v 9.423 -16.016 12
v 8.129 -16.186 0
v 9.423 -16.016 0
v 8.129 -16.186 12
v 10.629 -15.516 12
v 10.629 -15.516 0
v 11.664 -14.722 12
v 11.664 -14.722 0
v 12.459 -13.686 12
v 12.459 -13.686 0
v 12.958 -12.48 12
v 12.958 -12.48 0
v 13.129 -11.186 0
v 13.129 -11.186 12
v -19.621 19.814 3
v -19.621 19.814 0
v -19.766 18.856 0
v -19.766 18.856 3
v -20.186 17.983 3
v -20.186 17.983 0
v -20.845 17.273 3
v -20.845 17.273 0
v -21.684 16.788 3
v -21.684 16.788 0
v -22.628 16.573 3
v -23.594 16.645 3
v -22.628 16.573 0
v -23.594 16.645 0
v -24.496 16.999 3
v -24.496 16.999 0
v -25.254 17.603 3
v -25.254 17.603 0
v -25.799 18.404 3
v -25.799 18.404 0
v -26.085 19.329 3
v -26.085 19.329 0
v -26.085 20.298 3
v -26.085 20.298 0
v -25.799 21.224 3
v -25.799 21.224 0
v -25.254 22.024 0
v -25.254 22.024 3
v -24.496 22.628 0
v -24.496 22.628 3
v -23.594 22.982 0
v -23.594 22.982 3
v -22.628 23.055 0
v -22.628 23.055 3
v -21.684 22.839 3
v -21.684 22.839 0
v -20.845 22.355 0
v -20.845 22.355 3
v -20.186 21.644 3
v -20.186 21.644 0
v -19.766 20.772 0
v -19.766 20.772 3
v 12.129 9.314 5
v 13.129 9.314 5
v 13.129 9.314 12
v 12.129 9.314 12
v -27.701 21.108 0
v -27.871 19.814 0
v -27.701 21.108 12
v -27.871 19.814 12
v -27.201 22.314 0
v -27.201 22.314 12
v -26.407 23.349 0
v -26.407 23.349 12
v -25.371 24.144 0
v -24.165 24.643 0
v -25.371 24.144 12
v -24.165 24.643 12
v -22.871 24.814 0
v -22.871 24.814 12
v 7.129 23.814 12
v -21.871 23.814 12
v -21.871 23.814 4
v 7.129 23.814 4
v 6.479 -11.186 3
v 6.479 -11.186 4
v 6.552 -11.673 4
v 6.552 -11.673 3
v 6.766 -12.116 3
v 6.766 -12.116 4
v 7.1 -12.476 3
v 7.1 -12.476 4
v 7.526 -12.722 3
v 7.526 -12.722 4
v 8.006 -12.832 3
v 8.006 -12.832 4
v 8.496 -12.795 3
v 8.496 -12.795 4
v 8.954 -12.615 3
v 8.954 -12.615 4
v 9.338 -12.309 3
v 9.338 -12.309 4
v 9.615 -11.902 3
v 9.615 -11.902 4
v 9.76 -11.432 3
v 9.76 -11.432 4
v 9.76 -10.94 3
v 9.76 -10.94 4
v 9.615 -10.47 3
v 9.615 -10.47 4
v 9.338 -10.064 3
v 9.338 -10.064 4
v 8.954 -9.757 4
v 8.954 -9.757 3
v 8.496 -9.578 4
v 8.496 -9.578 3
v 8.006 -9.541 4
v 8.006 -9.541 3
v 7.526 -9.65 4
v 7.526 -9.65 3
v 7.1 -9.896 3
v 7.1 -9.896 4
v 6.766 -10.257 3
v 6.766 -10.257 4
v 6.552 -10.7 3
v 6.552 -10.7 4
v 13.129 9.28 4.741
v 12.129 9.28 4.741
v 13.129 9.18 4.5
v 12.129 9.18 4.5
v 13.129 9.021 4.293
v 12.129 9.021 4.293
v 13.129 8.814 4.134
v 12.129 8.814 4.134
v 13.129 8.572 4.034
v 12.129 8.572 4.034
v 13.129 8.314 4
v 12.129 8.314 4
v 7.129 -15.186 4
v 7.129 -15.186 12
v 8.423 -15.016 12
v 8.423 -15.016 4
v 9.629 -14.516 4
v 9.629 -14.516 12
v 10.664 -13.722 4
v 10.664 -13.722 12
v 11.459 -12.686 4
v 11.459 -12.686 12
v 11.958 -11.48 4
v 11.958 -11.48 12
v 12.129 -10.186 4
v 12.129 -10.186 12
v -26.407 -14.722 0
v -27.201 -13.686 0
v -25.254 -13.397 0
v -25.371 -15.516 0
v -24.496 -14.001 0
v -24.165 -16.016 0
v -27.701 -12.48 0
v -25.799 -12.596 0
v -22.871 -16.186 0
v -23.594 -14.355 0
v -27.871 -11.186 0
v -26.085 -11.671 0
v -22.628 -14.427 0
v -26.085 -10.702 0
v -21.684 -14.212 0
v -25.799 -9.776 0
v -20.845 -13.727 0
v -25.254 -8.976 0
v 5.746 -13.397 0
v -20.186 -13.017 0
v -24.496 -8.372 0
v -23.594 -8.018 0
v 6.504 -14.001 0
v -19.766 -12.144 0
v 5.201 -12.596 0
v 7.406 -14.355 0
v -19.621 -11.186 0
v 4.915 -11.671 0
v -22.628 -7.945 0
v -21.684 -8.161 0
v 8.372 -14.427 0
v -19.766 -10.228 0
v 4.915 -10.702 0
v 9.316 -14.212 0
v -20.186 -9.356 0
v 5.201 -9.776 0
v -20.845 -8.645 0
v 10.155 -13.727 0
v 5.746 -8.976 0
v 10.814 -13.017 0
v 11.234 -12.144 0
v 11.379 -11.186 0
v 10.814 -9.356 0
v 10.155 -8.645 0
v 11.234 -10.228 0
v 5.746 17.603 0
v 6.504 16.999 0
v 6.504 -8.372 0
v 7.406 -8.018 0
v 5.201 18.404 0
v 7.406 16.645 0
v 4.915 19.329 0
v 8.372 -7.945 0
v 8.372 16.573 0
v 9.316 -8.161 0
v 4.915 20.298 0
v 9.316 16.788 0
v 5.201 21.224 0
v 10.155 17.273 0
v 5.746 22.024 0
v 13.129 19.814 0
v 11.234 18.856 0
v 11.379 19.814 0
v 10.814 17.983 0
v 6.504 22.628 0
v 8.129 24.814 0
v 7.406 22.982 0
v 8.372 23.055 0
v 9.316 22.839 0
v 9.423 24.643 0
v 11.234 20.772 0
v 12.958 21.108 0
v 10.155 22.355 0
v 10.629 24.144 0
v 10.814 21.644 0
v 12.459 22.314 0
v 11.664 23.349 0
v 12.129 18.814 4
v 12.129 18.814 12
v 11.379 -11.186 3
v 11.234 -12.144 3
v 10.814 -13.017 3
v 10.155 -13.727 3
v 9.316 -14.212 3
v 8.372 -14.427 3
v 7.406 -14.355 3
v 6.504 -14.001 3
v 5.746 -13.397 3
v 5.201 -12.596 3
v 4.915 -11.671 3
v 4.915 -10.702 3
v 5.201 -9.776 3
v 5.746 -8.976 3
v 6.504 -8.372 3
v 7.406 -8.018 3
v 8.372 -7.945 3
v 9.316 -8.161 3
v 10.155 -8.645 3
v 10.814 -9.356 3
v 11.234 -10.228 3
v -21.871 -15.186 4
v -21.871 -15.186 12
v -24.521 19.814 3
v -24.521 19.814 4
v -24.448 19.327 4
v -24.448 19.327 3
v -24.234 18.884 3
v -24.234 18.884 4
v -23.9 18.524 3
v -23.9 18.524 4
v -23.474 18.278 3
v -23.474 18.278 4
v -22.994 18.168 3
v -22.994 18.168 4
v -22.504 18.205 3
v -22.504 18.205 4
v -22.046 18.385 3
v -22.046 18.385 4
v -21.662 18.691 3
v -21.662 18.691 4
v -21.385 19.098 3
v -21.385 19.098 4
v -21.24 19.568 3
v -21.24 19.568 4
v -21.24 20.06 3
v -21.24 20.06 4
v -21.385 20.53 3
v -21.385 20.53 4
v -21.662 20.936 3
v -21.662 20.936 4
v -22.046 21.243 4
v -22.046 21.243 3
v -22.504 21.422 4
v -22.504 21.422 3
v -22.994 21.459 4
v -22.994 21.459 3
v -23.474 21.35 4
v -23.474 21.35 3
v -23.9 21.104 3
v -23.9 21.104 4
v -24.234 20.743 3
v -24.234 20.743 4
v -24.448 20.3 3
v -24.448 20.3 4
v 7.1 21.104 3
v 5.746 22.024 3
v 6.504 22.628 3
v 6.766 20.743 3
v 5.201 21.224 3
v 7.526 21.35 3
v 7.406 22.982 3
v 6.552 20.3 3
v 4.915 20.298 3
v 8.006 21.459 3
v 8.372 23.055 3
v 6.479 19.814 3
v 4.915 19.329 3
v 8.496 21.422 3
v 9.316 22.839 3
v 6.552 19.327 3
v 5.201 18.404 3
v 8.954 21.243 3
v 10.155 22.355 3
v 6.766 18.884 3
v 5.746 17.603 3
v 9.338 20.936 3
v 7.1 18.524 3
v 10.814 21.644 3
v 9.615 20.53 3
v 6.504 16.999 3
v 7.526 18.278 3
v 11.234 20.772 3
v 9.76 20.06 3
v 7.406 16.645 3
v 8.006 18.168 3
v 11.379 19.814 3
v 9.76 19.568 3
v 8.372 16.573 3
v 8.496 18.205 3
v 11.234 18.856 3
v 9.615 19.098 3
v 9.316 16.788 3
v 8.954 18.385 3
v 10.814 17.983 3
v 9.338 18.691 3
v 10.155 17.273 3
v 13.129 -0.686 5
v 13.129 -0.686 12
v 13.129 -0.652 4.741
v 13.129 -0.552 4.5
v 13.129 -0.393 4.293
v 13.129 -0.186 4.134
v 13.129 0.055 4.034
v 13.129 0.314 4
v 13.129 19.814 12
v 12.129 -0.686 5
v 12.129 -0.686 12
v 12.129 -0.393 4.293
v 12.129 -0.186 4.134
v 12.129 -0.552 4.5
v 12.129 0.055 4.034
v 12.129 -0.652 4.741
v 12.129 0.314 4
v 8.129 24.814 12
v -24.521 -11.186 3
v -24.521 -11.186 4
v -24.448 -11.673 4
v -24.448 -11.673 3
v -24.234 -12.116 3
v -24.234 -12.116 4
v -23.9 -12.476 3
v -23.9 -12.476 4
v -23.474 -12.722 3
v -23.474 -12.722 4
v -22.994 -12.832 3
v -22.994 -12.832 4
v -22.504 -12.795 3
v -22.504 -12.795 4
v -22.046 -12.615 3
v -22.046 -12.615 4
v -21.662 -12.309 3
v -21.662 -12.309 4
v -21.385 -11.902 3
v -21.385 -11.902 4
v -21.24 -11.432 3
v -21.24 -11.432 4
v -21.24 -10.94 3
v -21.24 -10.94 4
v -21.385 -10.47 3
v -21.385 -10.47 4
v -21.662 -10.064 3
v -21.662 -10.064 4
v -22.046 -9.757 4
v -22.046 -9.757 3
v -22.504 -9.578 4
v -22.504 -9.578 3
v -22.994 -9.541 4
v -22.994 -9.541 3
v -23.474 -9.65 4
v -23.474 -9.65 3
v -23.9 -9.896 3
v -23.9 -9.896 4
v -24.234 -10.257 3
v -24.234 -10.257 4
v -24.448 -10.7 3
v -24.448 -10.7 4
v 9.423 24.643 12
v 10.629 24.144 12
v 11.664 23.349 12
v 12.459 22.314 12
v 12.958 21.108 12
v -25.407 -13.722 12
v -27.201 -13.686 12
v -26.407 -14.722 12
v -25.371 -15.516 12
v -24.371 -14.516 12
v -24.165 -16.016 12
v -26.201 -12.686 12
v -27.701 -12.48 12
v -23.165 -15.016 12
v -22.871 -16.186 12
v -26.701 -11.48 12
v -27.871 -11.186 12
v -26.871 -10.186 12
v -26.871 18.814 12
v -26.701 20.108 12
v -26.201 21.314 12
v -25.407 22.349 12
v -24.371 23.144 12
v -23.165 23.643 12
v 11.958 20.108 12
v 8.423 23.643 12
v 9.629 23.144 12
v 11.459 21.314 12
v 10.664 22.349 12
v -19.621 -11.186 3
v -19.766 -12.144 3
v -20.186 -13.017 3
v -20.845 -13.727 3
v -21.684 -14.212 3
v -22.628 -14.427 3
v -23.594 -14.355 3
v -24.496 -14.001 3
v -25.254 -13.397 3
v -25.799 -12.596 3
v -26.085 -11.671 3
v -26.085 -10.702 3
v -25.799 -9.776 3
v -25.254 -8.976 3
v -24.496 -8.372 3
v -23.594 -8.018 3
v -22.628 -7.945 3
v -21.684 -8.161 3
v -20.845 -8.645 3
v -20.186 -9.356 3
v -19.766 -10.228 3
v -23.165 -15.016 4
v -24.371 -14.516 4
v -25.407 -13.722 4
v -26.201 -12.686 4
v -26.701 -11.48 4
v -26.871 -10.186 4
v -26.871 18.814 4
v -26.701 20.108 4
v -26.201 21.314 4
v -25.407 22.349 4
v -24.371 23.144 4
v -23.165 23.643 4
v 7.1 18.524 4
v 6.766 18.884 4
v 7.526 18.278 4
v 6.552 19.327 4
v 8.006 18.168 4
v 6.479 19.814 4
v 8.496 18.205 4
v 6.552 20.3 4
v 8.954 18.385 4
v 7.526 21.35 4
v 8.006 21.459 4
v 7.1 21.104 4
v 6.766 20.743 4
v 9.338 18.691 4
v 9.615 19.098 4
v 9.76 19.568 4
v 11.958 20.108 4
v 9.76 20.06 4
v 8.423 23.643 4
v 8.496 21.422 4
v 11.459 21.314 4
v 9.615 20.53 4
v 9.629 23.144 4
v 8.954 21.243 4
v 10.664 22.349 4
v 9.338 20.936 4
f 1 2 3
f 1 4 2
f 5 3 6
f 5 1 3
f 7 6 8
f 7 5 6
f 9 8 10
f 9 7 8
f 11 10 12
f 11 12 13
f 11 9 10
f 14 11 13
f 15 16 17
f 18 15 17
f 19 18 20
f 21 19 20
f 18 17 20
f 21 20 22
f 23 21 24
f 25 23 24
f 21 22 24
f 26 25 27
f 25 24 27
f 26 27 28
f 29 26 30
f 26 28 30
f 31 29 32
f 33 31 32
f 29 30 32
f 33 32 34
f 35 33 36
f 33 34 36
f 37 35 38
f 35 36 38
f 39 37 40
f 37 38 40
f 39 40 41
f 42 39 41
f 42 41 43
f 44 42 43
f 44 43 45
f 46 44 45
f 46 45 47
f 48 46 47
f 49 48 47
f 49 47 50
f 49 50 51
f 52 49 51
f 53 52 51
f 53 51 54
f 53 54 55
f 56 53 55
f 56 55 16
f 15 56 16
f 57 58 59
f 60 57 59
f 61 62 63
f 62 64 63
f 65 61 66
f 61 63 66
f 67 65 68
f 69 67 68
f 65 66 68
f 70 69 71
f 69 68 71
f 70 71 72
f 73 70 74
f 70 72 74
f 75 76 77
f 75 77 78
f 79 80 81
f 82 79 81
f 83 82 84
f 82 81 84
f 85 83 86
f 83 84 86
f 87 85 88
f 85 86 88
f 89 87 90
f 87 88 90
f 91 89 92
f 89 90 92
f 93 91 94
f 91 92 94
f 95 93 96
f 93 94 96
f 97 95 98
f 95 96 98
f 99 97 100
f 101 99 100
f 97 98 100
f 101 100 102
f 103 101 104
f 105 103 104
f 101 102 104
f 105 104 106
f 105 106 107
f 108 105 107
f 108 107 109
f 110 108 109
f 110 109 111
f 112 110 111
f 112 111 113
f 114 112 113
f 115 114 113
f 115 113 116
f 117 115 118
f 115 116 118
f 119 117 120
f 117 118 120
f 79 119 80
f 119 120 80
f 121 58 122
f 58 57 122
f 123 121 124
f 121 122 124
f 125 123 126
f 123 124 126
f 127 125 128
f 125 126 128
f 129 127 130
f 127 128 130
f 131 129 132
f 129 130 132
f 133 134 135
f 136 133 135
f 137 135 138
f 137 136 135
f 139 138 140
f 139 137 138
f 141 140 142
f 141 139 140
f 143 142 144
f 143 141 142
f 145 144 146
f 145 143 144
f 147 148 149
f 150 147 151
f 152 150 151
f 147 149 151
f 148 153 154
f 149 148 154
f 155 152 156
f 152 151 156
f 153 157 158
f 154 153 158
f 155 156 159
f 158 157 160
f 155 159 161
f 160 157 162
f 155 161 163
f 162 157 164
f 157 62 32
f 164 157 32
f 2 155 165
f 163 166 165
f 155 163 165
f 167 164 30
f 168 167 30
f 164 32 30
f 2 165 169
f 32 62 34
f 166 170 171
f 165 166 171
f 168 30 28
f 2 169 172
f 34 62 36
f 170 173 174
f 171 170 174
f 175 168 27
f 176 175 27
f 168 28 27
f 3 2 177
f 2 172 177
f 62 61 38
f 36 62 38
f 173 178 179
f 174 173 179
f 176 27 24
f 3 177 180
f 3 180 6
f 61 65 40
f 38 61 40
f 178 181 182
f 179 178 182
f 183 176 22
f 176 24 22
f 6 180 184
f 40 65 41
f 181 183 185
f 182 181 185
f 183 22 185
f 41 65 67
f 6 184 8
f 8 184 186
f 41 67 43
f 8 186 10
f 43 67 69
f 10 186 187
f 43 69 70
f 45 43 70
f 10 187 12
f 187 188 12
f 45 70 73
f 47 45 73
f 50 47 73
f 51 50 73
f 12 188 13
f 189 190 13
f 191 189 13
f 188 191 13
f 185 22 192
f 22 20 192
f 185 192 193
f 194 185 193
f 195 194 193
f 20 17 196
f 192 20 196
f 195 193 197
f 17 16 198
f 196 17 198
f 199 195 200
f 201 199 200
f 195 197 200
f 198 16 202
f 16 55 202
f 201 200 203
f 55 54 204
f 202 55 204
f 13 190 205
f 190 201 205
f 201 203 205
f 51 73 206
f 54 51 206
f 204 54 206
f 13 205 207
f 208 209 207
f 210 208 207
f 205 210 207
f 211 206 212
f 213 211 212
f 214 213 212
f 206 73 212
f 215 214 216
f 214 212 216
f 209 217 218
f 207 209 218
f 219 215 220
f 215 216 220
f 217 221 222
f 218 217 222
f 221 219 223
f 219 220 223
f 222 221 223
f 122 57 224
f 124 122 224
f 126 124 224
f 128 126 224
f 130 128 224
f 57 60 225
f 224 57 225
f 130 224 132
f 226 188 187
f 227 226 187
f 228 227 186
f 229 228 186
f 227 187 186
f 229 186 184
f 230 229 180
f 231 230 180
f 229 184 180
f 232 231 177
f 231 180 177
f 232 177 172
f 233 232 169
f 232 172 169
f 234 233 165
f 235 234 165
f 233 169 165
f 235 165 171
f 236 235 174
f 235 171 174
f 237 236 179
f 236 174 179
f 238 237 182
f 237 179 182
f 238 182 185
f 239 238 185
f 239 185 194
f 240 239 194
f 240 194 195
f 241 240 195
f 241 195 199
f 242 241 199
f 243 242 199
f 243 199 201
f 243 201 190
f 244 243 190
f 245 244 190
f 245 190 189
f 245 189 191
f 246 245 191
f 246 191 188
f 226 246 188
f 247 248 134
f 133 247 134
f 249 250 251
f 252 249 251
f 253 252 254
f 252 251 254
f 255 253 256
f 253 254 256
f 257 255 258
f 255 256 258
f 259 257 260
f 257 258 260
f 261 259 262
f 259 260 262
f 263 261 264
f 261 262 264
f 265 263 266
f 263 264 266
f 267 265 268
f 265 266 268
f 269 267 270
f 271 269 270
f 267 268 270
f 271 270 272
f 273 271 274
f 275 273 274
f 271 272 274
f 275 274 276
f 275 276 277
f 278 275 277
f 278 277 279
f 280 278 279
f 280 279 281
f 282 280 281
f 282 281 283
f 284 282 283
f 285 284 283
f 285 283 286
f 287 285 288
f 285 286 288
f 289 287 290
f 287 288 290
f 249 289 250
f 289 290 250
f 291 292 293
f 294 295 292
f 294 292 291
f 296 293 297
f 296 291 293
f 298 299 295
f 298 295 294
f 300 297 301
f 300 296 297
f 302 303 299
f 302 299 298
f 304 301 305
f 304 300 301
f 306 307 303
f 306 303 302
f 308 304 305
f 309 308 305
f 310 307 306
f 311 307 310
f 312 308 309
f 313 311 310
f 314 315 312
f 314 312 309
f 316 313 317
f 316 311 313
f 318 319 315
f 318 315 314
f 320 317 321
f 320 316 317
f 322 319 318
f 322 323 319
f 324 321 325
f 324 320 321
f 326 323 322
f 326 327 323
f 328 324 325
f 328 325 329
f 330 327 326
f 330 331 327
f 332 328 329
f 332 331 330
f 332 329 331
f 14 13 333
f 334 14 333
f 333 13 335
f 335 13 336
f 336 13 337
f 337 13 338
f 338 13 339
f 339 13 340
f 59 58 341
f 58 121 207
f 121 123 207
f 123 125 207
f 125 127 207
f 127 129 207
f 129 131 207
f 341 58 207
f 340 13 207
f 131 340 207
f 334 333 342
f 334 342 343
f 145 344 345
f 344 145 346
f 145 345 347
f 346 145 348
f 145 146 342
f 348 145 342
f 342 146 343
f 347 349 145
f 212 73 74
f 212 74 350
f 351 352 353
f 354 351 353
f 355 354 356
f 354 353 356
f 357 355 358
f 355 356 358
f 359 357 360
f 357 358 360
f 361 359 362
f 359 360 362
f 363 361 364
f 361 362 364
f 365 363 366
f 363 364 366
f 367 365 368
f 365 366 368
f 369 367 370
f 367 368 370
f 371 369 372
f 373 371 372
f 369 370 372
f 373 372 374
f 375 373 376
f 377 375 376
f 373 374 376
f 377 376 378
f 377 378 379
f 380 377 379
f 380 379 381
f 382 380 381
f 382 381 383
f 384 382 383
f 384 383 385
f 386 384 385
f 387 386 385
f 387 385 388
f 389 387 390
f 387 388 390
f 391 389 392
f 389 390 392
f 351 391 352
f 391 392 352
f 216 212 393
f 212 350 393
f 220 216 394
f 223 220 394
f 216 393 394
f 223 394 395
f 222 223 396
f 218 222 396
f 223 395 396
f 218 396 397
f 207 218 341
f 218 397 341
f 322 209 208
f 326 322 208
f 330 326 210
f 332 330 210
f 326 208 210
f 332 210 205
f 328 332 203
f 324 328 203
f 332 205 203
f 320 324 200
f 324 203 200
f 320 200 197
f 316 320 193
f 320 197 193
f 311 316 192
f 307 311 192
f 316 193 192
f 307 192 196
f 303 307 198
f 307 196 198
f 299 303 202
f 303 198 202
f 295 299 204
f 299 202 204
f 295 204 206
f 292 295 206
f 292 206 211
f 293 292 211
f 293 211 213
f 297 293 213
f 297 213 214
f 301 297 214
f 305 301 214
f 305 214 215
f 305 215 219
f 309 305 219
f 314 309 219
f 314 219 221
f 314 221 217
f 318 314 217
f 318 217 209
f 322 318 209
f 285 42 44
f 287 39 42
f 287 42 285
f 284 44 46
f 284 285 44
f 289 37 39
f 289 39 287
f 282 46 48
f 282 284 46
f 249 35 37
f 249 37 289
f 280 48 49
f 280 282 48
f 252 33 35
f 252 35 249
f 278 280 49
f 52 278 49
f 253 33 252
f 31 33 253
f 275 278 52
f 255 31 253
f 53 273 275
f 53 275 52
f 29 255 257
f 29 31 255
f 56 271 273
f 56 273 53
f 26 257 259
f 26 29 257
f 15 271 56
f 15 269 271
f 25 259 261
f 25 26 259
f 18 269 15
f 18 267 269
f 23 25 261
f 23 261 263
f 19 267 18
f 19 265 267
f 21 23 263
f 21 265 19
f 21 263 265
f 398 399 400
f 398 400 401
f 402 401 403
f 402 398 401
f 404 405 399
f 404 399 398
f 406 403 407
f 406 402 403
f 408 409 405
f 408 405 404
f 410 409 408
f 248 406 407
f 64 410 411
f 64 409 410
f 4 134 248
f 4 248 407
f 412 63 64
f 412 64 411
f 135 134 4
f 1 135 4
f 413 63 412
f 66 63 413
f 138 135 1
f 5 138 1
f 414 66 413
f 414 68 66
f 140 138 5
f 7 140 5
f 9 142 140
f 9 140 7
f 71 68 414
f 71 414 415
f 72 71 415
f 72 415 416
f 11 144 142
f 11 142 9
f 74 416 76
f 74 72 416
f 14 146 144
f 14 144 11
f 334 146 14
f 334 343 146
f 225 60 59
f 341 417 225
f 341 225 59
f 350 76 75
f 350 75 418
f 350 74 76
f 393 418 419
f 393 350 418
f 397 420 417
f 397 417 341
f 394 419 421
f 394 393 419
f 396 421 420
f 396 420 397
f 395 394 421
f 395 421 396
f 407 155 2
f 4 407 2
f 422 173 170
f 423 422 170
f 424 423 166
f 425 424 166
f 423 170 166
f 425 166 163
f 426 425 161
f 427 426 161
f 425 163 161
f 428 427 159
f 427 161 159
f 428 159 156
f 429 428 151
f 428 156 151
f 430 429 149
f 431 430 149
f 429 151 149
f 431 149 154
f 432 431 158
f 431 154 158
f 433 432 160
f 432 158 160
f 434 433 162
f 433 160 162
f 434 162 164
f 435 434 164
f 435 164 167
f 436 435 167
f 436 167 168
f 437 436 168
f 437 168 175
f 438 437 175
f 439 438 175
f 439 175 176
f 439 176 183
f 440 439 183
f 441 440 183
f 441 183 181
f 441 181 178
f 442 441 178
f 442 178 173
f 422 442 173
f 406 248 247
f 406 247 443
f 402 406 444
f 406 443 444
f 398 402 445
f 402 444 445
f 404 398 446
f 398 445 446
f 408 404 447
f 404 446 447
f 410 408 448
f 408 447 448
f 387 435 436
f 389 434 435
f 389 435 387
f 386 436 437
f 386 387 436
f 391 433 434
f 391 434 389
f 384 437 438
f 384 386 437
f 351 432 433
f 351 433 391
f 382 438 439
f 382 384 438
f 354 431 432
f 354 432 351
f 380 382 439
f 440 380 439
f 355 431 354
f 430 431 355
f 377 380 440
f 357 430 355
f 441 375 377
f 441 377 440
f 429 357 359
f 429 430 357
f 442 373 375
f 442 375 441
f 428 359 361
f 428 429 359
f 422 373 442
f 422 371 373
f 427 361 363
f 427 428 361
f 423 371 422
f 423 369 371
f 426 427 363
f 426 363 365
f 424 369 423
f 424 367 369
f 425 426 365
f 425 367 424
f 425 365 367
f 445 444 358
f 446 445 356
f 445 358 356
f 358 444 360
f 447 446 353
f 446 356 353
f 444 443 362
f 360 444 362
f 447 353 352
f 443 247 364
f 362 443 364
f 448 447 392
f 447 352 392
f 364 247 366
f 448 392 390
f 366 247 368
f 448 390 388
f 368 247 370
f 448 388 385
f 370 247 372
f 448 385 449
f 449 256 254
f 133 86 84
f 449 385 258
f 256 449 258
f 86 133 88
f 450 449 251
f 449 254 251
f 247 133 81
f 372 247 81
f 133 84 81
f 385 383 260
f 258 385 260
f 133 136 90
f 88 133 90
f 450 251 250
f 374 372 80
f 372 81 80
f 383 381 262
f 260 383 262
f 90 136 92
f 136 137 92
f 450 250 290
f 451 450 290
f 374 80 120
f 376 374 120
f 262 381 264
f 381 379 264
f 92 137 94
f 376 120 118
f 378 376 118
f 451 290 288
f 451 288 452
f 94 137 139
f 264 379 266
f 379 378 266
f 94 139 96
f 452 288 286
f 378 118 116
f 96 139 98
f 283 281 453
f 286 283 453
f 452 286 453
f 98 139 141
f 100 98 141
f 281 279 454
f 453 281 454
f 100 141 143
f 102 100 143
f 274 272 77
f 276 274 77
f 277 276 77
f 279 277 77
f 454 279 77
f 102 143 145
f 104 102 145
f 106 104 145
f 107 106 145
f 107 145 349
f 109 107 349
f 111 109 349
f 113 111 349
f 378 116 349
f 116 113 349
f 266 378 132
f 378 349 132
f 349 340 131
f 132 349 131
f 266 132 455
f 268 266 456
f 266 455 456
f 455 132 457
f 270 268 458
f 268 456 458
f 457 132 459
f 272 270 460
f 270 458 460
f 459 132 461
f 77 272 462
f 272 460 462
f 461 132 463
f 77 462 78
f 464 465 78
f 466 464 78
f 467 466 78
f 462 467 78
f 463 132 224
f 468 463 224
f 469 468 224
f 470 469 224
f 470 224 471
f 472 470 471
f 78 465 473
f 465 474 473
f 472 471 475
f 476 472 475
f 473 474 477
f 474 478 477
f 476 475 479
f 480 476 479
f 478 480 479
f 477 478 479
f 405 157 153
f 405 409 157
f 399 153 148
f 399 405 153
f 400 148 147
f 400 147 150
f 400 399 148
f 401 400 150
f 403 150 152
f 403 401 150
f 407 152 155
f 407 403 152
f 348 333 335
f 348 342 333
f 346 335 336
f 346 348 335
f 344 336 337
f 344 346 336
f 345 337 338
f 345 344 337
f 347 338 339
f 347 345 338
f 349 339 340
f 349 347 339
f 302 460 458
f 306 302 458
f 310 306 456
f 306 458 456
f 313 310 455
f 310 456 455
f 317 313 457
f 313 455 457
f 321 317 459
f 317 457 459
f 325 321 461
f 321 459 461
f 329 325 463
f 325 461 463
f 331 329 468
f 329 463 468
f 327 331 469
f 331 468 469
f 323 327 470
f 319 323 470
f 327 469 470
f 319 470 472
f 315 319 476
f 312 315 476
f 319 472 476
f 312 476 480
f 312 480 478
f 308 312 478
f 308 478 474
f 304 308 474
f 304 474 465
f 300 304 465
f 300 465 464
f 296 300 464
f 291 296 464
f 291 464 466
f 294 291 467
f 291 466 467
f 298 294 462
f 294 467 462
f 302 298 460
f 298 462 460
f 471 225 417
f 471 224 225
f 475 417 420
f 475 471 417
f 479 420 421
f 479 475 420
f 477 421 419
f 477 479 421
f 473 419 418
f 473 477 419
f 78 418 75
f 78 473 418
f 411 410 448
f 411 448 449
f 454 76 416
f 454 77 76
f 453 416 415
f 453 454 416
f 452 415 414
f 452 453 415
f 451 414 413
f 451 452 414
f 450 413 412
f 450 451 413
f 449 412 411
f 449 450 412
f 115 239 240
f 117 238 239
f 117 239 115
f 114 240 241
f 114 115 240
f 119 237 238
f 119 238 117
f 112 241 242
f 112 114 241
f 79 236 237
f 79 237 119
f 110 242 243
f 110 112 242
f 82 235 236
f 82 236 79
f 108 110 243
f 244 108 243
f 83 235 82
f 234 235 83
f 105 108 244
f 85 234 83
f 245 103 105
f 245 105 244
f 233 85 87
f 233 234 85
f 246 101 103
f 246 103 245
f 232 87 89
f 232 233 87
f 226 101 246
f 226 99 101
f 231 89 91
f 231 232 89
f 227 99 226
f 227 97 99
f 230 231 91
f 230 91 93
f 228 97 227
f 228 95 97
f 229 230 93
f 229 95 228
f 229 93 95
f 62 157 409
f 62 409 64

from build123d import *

# Parameters (mm, degrees)
F0_W           = 41
F0_H           = 41
F1_DEPTH       = 12
F2_D           = 3.3
F2_DEPTH       = 20
F2_CBORE_D     = 6.5
F2_CBORE_DEPTH = 3
F2_TIP         = 0.9914200214
F3_W           = 39
F3_H           = 39
F4_DEPTH       = 8
F5_R           = 5
F6_W           = 10
F6_H           = 8
F7_DEPTH       = 1
F8_R           = 1


with BuildPart() as f1:
    # F0 (on Top) → F1 (new body)
    with BuildSketch(Plane.XY):
        with Locations((-7.3711453006, 4.3136782655)):
            Rectangle(F0_W, F0_H)
    extrude(amount=F1_DEPTH)

    # F2
    with Locations(Plane(origin=(0, 0, 0), x_dir=(1, 0, 0), z_dir=(0, 0, -1))):
        with Locations((8.1288546994, -19.8136782655), (-22.8711453006, -19.8136782655), (-22.8711453006, 11.1863217345), (8.1288546994, 11.1863217345)):
            CounterBoreHole(F2_D / 2, F2_CBORE_D / 2, F2_CBORE_DEPTH, depth=F2_DEPTH)
            with Locations((0, 0, -(F2_DEPTH + F2_TIP / 2))):  # 118° drill point
                Cone(0, F2_D / 2, F2_TIP, mode=Mode.SUBTRACT)

    # F3 (on face) → F4 (cut)
    with BuildSketch(Plane.XY.offset(12)):
        with Locations((-7.3711453006, 4.3136782655)):
            Rectangle(F3_W, F3_H)
    extrude(amount=-F4_DEPTH, mode=Mode.SUBTRACT)

    # F5
    f5_edges = [f1.edges().sort_by_distance(p)[0] for p in [
        (13.128855, -16.186322, 6),
        (12.128855, -15.186322, 8),
        (-27.871145, -16.186322, 6),
        (-26.871145, -15.186322, 8),
        (-27.871145, 24.813678, 6),
        (-26.871145, 23.813678, 8),
        (13.128855, 24.813678, 6),
        (12.128855, 23.813678, 8),
    ]]
    fillet(f5_edges, radius=F5_R)

    # F6 (on face) → F7 (cut, through all)
    with BuildSketch(Plane.YZ.offset(13.1288546994)):
        with Locations((4.3136782655, 8)):
            Rectangle(F6_W, F6_H)
    extrude(amount=-F7_DEPTH, mode=Mode.SUBTRACT)

    # F8
    f8_edges = [f1.edges().sort_by_distance(p)[0] for p in [
        (12.628855, 9.313678, 4),
        (12.628855, -0.686322, 4),
    ]]
    fillet(f8_edges, radius=F8_R)


solid = f1.part
